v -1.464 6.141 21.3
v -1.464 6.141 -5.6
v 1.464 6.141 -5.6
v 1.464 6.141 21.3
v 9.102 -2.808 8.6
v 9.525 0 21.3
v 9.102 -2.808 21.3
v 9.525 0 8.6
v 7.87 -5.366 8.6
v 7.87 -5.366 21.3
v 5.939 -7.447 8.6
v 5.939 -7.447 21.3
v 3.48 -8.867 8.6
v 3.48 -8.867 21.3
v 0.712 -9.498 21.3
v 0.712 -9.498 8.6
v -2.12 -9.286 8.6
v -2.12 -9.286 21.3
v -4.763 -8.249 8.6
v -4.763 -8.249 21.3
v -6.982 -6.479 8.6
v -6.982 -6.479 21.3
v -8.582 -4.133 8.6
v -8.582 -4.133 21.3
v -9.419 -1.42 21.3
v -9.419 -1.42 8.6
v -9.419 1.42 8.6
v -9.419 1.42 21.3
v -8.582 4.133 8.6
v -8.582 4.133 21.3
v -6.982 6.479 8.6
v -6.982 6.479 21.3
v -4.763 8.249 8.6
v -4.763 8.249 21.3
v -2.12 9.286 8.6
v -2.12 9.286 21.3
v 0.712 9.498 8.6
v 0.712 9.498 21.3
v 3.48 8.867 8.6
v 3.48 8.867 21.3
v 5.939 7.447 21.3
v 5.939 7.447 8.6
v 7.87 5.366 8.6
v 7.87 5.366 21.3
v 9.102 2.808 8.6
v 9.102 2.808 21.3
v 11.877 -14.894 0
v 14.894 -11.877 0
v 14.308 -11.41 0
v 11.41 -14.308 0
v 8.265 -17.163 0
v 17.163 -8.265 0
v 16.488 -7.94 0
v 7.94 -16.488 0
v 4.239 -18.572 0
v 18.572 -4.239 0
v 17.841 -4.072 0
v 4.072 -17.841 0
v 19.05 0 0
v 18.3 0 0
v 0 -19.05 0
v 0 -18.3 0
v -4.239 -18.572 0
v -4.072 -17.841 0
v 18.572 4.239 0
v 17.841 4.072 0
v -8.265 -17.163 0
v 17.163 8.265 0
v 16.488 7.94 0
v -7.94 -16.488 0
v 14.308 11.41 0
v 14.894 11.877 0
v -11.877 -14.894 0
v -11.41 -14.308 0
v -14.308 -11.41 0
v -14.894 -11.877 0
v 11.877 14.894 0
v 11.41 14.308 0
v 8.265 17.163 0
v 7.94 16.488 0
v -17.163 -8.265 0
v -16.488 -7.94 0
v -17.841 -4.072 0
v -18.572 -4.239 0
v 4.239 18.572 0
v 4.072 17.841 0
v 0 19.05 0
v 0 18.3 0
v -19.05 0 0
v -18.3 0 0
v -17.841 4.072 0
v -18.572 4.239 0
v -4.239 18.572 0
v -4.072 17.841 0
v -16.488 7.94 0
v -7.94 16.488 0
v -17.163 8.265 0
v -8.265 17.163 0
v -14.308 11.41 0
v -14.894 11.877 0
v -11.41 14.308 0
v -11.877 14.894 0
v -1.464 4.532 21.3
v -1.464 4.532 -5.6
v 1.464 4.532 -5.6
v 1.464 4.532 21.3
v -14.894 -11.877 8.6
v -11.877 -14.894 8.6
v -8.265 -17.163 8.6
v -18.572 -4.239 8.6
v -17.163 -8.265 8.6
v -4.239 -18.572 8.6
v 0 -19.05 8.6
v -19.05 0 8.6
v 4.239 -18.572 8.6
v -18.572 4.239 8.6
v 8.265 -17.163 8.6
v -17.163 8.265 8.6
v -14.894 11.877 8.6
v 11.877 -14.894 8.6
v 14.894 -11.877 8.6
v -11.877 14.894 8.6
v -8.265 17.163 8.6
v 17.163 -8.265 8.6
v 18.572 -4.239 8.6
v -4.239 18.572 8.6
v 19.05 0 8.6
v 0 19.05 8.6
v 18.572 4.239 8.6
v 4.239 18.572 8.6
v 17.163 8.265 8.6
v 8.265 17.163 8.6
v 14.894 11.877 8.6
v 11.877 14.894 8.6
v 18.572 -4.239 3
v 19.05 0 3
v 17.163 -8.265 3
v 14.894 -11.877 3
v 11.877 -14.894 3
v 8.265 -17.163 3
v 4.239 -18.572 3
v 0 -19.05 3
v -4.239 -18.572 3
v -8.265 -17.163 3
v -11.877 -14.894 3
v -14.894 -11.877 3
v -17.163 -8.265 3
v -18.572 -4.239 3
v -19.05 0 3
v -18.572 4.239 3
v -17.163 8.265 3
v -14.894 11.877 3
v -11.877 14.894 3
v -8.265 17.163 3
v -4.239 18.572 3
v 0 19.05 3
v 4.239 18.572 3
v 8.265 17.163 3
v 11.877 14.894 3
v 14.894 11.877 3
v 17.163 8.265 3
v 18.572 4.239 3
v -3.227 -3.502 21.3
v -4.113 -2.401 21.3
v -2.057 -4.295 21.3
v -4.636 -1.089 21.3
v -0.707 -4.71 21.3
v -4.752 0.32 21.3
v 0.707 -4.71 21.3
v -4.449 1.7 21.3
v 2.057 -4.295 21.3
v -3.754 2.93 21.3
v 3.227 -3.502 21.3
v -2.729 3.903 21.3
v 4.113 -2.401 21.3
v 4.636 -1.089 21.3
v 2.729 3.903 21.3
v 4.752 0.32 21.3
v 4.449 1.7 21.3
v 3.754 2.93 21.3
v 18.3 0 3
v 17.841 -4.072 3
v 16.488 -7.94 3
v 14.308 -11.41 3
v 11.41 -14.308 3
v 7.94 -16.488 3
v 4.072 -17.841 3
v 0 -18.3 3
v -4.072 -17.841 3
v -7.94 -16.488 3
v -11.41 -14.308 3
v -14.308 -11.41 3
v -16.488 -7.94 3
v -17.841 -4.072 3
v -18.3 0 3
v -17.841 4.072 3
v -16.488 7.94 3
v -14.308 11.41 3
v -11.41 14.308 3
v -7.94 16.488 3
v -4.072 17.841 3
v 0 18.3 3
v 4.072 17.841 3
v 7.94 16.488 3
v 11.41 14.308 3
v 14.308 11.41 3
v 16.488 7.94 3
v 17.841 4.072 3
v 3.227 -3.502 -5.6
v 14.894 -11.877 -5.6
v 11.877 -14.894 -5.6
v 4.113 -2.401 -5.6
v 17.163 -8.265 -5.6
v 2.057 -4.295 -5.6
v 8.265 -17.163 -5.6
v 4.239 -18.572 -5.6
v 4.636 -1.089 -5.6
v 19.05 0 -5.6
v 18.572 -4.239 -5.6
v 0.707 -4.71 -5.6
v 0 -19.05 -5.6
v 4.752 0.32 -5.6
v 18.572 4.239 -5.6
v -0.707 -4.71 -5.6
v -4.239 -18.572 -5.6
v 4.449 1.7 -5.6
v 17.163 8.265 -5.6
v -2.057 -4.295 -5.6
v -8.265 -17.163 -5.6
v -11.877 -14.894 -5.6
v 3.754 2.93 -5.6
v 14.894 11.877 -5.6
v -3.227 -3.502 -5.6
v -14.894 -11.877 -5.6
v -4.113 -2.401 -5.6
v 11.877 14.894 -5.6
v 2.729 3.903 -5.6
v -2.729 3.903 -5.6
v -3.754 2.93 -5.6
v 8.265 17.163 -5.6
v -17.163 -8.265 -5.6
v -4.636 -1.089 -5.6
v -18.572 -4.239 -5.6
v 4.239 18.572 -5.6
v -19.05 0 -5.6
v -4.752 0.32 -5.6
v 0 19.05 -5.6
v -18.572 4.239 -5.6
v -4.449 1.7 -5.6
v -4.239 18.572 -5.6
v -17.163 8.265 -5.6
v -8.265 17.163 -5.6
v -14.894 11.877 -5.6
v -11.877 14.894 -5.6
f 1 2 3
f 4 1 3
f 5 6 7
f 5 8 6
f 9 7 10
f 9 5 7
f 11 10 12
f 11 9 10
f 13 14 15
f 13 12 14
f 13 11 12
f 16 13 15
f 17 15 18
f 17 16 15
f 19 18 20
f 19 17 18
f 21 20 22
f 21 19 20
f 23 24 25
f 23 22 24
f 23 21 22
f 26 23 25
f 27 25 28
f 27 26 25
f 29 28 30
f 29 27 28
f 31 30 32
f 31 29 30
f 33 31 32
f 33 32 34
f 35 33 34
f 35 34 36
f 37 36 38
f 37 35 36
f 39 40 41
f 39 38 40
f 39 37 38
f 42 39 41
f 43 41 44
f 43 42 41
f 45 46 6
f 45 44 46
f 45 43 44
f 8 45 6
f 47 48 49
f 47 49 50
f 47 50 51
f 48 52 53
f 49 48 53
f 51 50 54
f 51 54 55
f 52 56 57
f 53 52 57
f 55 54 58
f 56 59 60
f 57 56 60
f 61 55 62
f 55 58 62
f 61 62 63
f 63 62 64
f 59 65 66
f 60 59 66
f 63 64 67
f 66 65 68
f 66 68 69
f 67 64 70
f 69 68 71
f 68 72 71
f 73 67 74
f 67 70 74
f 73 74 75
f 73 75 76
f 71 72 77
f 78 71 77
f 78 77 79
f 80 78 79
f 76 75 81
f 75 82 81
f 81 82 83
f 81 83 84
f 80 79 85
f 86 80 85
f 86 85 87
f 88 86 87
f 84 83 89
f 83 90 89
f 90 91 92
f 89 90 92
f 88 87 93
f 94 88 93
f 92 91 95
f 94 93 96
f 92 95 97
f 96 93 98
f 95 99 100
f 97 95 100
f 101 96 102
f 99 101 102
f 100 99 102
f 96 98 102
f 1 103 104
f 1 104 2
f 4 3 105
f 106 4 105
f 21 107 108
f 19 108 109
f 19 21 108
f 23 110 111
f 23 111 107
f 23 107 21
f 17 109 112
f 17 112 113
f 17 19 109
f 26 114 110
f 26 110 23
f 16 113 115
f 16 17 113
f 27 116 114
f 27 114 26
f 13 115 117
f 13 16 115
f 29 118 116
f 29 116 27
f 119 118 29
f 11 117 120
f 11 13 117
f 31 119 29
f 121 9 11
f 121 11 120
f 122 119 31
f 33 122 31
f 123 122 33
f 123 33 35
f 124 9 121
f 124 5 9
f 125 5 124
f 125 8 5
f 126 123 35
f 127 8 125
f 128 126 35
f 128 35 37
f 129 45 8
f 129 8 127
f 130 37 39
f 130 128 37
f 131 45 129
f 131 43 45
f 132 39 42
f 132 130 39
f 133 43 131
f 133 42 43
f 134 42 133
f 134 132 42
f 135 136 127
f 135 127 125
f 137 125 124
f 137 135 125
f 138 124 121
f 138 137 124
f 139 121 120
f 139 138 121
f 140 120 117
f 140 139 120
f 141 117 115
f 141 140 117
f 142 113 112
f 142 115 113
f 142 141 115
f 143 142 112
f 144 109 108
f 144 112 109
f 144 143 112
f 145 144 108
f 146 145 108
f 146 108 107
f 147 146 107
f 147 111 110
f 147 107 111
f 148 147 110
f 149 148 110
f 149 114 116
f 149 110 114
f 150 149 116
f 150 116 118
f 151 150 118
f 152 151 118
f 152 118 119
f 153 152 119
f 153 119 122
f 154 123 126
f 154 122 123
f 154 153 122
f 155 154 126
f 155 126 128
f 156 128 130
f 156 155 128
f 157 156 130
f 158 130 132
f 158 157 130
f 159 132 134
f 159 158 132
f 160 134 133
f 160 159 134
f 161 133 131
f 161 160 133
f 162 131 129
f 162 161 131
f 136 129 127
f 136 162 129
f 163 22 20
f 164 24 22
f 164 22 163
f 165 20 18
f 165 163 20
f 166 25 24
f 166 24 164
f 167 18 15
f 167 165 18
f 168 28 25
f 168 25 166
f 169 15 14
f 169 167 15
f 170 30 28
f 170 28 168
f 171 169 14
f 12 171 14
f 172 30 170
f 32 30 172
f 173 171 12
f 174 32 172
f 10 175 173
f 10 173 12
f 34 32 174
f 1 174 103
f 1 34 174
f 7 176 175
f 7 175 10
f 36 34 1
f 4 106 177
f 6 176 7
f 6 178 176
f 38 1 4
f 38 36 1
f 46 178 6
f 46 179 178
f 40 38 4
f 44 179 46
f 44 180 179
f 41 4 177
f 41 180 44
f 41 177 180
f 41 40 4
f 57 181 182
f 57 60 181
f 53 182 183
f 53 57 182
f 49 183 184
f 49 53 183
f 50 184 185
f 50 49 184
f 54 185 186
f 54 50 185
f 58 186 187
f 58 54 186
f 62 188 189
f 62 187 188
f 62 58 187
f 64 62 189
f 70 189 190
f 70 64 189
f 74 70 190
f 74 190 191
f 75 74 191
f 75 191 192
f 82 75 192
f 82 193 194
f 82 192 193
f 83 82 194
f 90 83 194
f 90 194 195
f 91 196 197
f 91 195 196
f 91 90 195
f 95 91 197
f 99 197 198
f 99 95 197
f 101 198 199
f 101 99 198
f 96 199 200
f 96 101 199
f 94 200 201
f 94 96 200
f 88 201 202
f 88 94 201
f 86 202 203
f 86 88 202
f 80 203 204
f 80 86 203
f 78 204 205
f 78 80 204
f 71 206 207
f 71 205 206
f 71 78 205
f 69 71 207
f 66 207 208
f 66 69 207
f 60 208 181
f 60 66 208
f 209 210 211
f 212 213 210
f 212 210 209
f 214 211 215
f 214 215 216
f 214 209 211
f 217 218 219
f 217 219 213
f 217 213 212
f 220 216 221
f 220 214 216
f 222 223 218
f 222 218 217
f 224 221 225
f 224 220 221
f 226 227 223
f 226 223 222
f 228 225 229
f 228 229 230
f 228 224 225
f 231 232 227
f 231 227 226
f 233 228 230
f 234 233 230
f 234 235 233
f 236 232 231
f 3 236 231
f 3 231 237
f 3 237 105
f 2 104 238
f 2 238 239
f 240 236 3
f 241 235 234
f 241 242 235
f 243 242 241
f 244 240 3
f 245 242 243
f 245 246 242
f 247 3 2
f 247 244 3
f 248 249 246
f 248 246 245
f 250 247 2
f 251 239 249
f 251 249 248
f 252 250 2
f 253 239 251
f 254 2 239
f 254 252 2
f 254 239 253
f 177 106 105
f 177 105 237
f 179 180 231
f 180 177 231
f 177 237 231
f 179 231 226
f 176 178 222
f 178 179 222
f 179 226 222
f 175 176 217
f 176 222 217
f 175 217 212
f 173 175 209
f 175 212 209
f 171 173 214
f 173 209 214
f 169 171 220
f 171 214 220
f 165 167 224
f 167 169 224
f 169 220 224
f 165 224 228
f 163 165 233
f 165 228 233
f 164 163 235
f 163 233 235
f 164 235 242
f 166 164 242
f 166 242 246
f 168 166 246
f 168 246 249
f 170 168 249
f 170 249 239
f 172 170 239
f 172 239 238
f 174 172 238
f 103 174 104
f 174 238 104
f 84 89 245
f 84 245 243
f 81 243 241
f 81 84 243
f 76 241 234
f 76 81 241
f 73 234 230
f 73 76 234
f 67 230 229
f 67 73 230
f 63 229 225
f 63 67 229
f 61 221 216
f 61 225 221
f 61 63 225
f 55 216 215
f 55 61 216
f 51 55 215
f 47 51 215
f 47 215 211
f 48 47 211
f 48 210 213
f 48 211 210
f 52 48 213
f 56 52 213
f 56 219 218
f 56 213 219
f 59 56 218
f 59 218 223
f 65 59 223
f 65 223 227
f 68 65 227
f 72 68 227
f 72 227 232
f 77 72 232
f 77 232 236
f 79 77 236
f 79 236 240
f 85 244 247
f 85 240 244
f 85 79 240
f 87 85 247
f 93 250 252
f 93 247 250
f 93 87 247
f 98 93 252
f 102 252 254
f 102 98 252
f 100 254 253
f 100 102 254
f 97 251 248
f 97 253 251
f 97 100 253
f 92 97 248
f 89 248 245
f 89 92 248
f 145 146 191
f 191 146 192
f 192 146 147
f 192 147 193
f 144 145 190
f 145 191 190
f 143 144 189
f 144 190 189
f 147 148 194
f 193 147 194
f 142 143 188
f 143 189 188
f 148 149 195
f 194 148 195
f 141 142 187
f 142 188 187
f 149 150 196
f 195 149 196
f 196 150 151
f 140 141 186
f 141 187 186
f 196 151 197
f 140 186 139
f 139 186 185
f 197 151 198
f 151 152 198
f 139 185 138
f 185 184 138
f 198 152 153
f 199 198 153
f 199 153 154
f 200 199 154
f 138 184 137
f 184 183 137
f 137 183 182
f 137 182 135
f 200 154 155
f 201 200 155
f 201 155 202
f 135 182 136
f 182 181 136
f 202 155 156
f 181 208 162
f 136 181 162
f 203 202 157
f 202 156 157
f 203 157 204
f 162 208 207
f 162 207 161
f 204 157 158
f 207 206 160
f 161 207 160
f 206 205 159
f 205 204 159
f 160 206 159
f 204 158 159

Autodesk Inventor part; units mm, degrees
ref_plane "YZ Plane" through (0, 0, 0) normal (1, 0, 0) x (0, 1, 0)
ref_plane "XZ Plane" through (0, 0, 0) normal (0, 1, 0) x (-1, 0, 0)
ref_plane "XY Plane" through (0, 0, 0) normal (0, 0, 1) x (1, 0, 0)
sketch "Sketch4" plane through (0, 0, 0) normal (0, 0, 1) x (1, 0, 0)
  circle A0 centre (0, 0) radius 18.3
  dimension "d9" = 36.6
extrude "Extrusion4" add sketch "Sketch4" along normal blind 3
sketch "Sketch5" plane through (0, 0, 3) normal (0, 0, 1) x (1, 0, 0)
  circle A0 centre (0, 0) radius 18.3 projected
  circle A1 centre (0, 0) radius 19.05
  dimension "d12" = 38.1
extrude "Extrusion5" add sketch "Sketch5" along normal blind 5.6 contours A0 | A1
sketch "Sketch6" plane through (0, 0, 0) normal (0, 0, -1) x (-1, 0, 0)
  circle A0 centre (0, 0) radius 18.3 projected
  circle A1 centre (0, 0) radius 19.05
  dimension "d15" = 38.1
extrude "Extrusion6" add sketch "Sketch6" along normal blind 5.6 contours A0 | A1
sketch "Sketch7" plane through (0, 0, 8.6) normal (0, 0, 1) x (1, 0, 0)
  circle A0 centre (0, 0) radius 19.05 projected
  circle A1 centre (0, 0) radius 9.525
  dimension "d18" = 19.05
extrude "Extrusion7" add sketch "Sketch7" along normal blind 12.7 contours A1
sketch "Sketch8" plane through (0, 0, -5.6) normal (0, 0, -1) x (-1, 0, 0)
  circle A0 centre (0, 0) radius 19.05 projected
  circle A1 centre (0, 0) radius 4.7625
  dimension "d21" = 9.525
extrude "Extrusion8" cut sketch "Sketch8" against normal blind 38.1 contours A1
sketch "Sketch9" plane through (0, 0, -5.6) normal (0, 0, -1) x (-1, 0, 0)
  circle A0 centre (0, 0) radius 4.7625 projected
  line L0 (-1.4638, 3.2131) -> (1.4638, 3.2131)
  line L1 (1.4638, 3.2131) -> (1.4638, 6.1406)
  line L2 (1.4638, 6.1406) -> (-1.4638, 6.1406)
  line L3 (-1.4638, 6.1406) -> (-1.4638, 3.2131)
  dimension "d24" = 2.9276
  dimension "d25" = 2.9276
  dimension "d26" = 3.2131
  dimension "d27" = 1.4638
extrude "Extrusion9" cut sketch "Sketch9" against normal blind 38.1 contours L1 L0 L3 A0 | A0 L3 L2 L1 picked at (0.165, 3.721)
equation "\"d25\" = d24"
equation "\"d27\" = 0.5 * d25"
properties part number "Puller Wheel"
